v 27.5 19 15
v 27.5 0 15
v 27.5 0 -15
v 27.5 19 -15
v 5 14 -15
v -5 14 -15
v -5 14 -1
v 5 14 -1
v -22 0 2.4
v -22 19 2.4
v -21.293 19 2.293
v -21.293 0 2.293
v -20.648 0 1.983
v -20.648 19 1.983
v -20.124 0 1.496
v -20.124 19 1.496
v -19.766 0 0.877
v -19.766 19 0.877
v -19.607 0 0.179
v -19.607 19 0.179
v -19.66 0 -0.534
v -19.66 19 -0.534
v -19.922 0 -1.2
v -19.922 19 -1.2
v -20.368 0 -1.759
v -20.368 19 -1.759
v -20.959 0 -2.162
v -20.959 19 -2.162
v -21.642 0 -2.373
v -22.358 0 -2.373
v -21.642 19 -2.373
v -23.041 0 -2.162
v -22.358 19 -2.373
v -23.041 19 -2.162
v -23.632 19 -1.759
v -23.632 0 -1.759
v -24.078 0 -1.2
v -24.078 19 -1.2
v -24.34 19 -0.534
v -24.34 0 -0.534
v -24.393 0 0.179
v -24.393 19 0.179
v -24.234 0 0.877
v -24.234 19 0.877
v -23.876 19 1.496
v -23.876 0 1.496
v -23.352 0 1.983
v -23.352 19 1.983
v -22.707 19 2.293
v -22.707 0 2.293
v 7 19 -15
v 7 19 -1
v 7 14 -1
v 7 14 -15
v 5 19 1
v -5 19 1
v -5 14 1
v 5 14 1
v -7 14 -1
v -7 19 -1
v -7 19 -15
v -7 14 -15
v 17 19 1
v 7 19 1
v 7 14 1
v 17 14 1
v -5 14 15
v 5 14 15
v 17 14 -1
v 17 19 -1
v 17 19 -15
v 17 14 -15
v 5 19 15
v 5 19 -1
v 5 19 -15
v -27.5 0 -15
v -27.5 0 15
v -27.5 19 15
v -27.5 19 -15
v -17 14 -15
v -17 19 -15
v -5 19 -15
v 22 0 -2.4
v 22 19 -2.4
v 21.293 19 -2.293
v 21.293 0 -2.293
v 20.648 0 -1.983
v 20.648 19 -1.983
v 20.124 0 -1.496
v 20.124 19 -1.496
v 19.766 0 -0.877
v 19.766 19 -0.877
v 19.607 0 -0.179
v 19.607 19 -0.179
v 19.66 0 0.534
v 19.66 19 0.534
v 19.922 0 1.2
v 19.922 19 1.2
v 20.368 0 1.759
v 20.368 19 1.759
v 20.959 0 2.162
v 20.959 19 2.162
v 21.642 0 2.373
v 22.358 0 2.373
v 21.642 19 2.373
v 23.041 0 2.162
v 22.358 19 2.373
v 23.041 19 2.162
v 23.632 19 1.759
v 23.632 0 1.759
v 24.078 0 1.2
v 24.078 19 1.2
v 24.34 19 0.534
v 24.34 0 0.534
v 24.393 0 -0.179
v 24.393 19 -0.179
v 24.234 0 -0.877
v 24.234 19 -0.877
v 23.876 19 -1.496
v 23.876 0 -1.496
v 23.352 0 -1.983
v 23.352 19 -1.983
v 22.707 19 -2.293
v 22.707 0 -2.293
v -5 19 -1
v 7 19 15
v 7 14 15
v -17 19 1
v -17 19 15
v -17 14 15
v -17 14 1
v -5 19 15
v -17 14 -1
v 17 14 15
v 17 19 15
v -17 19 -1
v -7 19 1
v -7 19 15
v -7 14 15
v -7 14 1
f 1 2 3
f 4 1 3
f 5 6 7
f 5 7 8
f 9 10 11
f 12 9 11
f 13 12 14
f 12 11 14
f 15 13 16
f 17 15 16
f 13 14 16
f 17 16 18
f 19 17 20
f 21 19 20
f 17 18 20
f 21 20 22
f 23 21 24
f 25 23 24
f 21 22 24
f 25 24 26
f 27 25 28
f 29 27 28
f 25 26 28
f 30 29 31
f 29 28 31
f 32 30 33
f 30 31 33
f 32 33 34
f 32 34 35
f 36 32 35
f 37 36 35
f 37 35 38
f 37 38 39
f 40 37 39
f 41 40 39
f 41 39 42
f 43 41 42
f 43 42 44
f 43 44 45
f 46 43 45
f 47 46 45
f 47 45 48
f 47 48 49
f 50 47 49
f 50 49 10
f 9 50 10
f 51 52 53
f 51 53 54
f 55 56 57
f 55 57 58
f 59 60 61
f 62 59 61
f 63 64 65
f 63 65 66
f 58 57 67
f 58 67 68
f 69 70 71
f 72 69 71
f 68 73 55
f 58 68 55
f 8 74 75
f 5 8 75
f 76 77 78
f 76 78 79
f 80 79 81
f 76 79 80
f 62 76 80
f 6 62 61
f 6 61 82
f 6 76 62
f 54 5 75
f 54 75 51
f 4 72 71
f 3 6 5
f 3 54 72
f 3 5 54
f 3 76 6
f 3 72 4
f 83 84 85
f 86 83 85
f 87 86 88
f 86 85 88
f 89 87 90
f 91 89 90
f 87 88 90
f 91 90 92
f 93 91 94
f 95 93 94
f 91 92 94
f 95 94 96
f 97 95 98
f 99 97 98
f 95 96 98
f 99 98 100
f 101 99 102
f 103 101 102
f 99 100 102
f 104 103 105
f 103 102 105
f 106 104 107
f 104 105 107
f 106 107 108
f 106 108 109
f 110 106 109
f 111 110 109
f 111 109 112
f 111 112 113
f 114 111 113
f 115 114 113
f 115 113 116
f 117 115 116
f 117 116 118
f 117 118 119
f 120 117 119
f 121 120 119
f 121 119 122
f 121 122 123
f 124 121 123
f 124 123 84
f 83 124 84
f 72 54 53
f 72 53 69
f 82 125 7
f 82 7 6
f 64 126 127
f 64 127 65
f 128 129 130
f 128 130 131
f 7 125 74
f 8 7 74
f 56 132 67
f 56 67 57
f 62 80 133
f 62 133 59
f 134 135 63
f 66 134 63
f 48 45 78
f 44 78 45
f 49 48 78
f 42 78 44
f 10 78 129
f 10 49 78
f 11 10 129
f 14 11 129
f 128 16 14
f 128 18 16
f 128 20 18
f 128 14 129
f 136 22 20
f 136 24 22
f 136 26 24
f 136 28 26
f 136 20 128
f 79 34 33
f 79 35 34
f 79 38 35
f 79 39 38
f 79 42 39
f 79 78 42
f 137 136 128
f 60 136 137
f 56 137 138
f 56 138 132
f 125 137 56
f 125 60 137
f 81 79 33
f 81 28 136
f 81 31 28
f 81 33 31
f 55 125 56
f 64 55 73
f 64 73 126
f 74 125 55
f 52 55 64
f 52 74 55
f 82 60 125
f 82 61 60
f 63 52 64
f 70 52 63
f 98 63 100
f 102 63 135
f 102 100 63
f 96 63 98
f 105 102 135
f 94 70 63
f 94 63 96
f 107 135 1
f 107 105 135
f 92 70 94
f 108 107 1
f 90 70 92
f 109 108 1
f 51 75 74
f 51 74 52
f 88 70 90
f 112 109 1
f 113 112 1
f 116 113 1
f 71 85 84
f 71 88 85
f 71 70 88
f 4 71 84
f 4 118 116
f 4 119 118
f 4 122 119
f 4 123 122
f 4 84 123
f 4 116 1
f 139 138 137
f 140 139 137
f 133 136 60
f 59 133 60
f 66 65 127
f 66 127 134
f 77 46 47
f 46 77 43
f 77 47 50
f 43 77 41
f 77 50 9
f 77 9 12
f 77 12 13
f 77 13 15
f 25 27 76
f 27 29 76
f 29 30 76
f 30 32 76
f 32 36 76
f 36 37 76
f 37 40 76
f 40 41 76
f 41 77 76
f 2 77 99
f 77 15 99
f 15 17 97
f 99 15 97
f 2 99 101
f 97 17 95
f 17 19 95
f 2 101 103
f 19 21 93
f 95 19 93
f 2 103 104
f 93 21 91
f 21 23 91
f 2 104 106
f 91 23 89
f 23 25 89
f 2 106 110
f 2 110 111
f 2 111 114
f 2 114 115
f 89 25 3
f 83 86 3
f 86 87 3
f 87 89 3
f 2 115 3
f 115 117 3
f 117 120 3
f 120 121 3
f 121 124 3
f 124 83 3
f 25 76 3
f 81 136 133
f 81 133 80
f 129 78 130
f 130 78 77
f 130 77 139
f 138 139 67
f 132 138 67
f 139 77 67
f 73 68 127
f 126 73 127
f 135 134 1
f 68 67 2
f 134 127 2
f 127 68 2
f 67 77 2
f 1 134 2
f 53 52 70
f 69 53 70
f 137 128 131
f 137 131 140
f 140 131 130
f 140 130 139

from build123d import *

# Parameters (mm, degrees)
SKETCH_1_W          = 55
SKETCH_1_H          = 30
EXTRUDE_1_DEPTH     = 19
SKETCH_2_R          = 2.4
CUT_EXTRUDE_1_DEPTH = 37.636730203
SKETCH_3_W          = 10
SKETCH_3_H          = 14
CUT_EXTRUDE_2_DEPTH = 5


with BuildPart() as part:
    # 草图1 → 凸台-拉伸1 (new body)
    with BuildSketch(Plane(origin=(0, 0, 0), x_dir=(1, 0, 0), z_dir=(0, 1, 0))):
        Rectangle(SKETCH_1_W, SKETCH_1_H)
    extrude(amount=EXTRUDE_1_DEPTH)

    # 草图2 → 切除-拉伸1 (cut, through all)
    with BuildSketch(Plane(origin=(0, 19, 0), x_dir=(1, 0, 0), z_dir=(0, 1, 0))):
        with Locations(Location((-22, 0, 0), (0, 0, 270))):
            Circle(SKETCH_2_R)
        with Locations(Location((22, 0, 0), (0, 0, 90))):
            Circle(SKETCH_2_R)
    extrude(amount=-CUT_EXTRUDE_1_DEPTH, mode=Mode.SUBTRACT)

    # 草图3 → 切除-拉伸2 (cut)
    with BuildSketch(Plane(origin=(0, 19, 0), x_dir=(1, 0, 0), z_dir=(0, 1, 0))):
        with Locations((-12, 8)):
            Rectangle(SKETCH_3_W, SKETCH_3_H)
        with Locations((0, 8)):
            Rectangle(SKETCH_3_W, SKETCH_3_H)
        with Locations((12, 8)):
            Rectangle(SKETCH_3_W, SKETCH_3_H)
        with Locations((12, -8)):
            Rectangle(SKETCH_3_W, SKETCH_3_H)
        with Locations((0, -8)):
            Rectangle(SKETCH_3_W, SKETCH_3_H)
        with Locations((-12, -8)):
            Rectangle(SKETCH_3_W, SKETCH_3_H)
    extrude(amount=-CUT_EXTRUDE_2_DEPTH, mode=Mode.SUBTRACT)


solid = part.part
